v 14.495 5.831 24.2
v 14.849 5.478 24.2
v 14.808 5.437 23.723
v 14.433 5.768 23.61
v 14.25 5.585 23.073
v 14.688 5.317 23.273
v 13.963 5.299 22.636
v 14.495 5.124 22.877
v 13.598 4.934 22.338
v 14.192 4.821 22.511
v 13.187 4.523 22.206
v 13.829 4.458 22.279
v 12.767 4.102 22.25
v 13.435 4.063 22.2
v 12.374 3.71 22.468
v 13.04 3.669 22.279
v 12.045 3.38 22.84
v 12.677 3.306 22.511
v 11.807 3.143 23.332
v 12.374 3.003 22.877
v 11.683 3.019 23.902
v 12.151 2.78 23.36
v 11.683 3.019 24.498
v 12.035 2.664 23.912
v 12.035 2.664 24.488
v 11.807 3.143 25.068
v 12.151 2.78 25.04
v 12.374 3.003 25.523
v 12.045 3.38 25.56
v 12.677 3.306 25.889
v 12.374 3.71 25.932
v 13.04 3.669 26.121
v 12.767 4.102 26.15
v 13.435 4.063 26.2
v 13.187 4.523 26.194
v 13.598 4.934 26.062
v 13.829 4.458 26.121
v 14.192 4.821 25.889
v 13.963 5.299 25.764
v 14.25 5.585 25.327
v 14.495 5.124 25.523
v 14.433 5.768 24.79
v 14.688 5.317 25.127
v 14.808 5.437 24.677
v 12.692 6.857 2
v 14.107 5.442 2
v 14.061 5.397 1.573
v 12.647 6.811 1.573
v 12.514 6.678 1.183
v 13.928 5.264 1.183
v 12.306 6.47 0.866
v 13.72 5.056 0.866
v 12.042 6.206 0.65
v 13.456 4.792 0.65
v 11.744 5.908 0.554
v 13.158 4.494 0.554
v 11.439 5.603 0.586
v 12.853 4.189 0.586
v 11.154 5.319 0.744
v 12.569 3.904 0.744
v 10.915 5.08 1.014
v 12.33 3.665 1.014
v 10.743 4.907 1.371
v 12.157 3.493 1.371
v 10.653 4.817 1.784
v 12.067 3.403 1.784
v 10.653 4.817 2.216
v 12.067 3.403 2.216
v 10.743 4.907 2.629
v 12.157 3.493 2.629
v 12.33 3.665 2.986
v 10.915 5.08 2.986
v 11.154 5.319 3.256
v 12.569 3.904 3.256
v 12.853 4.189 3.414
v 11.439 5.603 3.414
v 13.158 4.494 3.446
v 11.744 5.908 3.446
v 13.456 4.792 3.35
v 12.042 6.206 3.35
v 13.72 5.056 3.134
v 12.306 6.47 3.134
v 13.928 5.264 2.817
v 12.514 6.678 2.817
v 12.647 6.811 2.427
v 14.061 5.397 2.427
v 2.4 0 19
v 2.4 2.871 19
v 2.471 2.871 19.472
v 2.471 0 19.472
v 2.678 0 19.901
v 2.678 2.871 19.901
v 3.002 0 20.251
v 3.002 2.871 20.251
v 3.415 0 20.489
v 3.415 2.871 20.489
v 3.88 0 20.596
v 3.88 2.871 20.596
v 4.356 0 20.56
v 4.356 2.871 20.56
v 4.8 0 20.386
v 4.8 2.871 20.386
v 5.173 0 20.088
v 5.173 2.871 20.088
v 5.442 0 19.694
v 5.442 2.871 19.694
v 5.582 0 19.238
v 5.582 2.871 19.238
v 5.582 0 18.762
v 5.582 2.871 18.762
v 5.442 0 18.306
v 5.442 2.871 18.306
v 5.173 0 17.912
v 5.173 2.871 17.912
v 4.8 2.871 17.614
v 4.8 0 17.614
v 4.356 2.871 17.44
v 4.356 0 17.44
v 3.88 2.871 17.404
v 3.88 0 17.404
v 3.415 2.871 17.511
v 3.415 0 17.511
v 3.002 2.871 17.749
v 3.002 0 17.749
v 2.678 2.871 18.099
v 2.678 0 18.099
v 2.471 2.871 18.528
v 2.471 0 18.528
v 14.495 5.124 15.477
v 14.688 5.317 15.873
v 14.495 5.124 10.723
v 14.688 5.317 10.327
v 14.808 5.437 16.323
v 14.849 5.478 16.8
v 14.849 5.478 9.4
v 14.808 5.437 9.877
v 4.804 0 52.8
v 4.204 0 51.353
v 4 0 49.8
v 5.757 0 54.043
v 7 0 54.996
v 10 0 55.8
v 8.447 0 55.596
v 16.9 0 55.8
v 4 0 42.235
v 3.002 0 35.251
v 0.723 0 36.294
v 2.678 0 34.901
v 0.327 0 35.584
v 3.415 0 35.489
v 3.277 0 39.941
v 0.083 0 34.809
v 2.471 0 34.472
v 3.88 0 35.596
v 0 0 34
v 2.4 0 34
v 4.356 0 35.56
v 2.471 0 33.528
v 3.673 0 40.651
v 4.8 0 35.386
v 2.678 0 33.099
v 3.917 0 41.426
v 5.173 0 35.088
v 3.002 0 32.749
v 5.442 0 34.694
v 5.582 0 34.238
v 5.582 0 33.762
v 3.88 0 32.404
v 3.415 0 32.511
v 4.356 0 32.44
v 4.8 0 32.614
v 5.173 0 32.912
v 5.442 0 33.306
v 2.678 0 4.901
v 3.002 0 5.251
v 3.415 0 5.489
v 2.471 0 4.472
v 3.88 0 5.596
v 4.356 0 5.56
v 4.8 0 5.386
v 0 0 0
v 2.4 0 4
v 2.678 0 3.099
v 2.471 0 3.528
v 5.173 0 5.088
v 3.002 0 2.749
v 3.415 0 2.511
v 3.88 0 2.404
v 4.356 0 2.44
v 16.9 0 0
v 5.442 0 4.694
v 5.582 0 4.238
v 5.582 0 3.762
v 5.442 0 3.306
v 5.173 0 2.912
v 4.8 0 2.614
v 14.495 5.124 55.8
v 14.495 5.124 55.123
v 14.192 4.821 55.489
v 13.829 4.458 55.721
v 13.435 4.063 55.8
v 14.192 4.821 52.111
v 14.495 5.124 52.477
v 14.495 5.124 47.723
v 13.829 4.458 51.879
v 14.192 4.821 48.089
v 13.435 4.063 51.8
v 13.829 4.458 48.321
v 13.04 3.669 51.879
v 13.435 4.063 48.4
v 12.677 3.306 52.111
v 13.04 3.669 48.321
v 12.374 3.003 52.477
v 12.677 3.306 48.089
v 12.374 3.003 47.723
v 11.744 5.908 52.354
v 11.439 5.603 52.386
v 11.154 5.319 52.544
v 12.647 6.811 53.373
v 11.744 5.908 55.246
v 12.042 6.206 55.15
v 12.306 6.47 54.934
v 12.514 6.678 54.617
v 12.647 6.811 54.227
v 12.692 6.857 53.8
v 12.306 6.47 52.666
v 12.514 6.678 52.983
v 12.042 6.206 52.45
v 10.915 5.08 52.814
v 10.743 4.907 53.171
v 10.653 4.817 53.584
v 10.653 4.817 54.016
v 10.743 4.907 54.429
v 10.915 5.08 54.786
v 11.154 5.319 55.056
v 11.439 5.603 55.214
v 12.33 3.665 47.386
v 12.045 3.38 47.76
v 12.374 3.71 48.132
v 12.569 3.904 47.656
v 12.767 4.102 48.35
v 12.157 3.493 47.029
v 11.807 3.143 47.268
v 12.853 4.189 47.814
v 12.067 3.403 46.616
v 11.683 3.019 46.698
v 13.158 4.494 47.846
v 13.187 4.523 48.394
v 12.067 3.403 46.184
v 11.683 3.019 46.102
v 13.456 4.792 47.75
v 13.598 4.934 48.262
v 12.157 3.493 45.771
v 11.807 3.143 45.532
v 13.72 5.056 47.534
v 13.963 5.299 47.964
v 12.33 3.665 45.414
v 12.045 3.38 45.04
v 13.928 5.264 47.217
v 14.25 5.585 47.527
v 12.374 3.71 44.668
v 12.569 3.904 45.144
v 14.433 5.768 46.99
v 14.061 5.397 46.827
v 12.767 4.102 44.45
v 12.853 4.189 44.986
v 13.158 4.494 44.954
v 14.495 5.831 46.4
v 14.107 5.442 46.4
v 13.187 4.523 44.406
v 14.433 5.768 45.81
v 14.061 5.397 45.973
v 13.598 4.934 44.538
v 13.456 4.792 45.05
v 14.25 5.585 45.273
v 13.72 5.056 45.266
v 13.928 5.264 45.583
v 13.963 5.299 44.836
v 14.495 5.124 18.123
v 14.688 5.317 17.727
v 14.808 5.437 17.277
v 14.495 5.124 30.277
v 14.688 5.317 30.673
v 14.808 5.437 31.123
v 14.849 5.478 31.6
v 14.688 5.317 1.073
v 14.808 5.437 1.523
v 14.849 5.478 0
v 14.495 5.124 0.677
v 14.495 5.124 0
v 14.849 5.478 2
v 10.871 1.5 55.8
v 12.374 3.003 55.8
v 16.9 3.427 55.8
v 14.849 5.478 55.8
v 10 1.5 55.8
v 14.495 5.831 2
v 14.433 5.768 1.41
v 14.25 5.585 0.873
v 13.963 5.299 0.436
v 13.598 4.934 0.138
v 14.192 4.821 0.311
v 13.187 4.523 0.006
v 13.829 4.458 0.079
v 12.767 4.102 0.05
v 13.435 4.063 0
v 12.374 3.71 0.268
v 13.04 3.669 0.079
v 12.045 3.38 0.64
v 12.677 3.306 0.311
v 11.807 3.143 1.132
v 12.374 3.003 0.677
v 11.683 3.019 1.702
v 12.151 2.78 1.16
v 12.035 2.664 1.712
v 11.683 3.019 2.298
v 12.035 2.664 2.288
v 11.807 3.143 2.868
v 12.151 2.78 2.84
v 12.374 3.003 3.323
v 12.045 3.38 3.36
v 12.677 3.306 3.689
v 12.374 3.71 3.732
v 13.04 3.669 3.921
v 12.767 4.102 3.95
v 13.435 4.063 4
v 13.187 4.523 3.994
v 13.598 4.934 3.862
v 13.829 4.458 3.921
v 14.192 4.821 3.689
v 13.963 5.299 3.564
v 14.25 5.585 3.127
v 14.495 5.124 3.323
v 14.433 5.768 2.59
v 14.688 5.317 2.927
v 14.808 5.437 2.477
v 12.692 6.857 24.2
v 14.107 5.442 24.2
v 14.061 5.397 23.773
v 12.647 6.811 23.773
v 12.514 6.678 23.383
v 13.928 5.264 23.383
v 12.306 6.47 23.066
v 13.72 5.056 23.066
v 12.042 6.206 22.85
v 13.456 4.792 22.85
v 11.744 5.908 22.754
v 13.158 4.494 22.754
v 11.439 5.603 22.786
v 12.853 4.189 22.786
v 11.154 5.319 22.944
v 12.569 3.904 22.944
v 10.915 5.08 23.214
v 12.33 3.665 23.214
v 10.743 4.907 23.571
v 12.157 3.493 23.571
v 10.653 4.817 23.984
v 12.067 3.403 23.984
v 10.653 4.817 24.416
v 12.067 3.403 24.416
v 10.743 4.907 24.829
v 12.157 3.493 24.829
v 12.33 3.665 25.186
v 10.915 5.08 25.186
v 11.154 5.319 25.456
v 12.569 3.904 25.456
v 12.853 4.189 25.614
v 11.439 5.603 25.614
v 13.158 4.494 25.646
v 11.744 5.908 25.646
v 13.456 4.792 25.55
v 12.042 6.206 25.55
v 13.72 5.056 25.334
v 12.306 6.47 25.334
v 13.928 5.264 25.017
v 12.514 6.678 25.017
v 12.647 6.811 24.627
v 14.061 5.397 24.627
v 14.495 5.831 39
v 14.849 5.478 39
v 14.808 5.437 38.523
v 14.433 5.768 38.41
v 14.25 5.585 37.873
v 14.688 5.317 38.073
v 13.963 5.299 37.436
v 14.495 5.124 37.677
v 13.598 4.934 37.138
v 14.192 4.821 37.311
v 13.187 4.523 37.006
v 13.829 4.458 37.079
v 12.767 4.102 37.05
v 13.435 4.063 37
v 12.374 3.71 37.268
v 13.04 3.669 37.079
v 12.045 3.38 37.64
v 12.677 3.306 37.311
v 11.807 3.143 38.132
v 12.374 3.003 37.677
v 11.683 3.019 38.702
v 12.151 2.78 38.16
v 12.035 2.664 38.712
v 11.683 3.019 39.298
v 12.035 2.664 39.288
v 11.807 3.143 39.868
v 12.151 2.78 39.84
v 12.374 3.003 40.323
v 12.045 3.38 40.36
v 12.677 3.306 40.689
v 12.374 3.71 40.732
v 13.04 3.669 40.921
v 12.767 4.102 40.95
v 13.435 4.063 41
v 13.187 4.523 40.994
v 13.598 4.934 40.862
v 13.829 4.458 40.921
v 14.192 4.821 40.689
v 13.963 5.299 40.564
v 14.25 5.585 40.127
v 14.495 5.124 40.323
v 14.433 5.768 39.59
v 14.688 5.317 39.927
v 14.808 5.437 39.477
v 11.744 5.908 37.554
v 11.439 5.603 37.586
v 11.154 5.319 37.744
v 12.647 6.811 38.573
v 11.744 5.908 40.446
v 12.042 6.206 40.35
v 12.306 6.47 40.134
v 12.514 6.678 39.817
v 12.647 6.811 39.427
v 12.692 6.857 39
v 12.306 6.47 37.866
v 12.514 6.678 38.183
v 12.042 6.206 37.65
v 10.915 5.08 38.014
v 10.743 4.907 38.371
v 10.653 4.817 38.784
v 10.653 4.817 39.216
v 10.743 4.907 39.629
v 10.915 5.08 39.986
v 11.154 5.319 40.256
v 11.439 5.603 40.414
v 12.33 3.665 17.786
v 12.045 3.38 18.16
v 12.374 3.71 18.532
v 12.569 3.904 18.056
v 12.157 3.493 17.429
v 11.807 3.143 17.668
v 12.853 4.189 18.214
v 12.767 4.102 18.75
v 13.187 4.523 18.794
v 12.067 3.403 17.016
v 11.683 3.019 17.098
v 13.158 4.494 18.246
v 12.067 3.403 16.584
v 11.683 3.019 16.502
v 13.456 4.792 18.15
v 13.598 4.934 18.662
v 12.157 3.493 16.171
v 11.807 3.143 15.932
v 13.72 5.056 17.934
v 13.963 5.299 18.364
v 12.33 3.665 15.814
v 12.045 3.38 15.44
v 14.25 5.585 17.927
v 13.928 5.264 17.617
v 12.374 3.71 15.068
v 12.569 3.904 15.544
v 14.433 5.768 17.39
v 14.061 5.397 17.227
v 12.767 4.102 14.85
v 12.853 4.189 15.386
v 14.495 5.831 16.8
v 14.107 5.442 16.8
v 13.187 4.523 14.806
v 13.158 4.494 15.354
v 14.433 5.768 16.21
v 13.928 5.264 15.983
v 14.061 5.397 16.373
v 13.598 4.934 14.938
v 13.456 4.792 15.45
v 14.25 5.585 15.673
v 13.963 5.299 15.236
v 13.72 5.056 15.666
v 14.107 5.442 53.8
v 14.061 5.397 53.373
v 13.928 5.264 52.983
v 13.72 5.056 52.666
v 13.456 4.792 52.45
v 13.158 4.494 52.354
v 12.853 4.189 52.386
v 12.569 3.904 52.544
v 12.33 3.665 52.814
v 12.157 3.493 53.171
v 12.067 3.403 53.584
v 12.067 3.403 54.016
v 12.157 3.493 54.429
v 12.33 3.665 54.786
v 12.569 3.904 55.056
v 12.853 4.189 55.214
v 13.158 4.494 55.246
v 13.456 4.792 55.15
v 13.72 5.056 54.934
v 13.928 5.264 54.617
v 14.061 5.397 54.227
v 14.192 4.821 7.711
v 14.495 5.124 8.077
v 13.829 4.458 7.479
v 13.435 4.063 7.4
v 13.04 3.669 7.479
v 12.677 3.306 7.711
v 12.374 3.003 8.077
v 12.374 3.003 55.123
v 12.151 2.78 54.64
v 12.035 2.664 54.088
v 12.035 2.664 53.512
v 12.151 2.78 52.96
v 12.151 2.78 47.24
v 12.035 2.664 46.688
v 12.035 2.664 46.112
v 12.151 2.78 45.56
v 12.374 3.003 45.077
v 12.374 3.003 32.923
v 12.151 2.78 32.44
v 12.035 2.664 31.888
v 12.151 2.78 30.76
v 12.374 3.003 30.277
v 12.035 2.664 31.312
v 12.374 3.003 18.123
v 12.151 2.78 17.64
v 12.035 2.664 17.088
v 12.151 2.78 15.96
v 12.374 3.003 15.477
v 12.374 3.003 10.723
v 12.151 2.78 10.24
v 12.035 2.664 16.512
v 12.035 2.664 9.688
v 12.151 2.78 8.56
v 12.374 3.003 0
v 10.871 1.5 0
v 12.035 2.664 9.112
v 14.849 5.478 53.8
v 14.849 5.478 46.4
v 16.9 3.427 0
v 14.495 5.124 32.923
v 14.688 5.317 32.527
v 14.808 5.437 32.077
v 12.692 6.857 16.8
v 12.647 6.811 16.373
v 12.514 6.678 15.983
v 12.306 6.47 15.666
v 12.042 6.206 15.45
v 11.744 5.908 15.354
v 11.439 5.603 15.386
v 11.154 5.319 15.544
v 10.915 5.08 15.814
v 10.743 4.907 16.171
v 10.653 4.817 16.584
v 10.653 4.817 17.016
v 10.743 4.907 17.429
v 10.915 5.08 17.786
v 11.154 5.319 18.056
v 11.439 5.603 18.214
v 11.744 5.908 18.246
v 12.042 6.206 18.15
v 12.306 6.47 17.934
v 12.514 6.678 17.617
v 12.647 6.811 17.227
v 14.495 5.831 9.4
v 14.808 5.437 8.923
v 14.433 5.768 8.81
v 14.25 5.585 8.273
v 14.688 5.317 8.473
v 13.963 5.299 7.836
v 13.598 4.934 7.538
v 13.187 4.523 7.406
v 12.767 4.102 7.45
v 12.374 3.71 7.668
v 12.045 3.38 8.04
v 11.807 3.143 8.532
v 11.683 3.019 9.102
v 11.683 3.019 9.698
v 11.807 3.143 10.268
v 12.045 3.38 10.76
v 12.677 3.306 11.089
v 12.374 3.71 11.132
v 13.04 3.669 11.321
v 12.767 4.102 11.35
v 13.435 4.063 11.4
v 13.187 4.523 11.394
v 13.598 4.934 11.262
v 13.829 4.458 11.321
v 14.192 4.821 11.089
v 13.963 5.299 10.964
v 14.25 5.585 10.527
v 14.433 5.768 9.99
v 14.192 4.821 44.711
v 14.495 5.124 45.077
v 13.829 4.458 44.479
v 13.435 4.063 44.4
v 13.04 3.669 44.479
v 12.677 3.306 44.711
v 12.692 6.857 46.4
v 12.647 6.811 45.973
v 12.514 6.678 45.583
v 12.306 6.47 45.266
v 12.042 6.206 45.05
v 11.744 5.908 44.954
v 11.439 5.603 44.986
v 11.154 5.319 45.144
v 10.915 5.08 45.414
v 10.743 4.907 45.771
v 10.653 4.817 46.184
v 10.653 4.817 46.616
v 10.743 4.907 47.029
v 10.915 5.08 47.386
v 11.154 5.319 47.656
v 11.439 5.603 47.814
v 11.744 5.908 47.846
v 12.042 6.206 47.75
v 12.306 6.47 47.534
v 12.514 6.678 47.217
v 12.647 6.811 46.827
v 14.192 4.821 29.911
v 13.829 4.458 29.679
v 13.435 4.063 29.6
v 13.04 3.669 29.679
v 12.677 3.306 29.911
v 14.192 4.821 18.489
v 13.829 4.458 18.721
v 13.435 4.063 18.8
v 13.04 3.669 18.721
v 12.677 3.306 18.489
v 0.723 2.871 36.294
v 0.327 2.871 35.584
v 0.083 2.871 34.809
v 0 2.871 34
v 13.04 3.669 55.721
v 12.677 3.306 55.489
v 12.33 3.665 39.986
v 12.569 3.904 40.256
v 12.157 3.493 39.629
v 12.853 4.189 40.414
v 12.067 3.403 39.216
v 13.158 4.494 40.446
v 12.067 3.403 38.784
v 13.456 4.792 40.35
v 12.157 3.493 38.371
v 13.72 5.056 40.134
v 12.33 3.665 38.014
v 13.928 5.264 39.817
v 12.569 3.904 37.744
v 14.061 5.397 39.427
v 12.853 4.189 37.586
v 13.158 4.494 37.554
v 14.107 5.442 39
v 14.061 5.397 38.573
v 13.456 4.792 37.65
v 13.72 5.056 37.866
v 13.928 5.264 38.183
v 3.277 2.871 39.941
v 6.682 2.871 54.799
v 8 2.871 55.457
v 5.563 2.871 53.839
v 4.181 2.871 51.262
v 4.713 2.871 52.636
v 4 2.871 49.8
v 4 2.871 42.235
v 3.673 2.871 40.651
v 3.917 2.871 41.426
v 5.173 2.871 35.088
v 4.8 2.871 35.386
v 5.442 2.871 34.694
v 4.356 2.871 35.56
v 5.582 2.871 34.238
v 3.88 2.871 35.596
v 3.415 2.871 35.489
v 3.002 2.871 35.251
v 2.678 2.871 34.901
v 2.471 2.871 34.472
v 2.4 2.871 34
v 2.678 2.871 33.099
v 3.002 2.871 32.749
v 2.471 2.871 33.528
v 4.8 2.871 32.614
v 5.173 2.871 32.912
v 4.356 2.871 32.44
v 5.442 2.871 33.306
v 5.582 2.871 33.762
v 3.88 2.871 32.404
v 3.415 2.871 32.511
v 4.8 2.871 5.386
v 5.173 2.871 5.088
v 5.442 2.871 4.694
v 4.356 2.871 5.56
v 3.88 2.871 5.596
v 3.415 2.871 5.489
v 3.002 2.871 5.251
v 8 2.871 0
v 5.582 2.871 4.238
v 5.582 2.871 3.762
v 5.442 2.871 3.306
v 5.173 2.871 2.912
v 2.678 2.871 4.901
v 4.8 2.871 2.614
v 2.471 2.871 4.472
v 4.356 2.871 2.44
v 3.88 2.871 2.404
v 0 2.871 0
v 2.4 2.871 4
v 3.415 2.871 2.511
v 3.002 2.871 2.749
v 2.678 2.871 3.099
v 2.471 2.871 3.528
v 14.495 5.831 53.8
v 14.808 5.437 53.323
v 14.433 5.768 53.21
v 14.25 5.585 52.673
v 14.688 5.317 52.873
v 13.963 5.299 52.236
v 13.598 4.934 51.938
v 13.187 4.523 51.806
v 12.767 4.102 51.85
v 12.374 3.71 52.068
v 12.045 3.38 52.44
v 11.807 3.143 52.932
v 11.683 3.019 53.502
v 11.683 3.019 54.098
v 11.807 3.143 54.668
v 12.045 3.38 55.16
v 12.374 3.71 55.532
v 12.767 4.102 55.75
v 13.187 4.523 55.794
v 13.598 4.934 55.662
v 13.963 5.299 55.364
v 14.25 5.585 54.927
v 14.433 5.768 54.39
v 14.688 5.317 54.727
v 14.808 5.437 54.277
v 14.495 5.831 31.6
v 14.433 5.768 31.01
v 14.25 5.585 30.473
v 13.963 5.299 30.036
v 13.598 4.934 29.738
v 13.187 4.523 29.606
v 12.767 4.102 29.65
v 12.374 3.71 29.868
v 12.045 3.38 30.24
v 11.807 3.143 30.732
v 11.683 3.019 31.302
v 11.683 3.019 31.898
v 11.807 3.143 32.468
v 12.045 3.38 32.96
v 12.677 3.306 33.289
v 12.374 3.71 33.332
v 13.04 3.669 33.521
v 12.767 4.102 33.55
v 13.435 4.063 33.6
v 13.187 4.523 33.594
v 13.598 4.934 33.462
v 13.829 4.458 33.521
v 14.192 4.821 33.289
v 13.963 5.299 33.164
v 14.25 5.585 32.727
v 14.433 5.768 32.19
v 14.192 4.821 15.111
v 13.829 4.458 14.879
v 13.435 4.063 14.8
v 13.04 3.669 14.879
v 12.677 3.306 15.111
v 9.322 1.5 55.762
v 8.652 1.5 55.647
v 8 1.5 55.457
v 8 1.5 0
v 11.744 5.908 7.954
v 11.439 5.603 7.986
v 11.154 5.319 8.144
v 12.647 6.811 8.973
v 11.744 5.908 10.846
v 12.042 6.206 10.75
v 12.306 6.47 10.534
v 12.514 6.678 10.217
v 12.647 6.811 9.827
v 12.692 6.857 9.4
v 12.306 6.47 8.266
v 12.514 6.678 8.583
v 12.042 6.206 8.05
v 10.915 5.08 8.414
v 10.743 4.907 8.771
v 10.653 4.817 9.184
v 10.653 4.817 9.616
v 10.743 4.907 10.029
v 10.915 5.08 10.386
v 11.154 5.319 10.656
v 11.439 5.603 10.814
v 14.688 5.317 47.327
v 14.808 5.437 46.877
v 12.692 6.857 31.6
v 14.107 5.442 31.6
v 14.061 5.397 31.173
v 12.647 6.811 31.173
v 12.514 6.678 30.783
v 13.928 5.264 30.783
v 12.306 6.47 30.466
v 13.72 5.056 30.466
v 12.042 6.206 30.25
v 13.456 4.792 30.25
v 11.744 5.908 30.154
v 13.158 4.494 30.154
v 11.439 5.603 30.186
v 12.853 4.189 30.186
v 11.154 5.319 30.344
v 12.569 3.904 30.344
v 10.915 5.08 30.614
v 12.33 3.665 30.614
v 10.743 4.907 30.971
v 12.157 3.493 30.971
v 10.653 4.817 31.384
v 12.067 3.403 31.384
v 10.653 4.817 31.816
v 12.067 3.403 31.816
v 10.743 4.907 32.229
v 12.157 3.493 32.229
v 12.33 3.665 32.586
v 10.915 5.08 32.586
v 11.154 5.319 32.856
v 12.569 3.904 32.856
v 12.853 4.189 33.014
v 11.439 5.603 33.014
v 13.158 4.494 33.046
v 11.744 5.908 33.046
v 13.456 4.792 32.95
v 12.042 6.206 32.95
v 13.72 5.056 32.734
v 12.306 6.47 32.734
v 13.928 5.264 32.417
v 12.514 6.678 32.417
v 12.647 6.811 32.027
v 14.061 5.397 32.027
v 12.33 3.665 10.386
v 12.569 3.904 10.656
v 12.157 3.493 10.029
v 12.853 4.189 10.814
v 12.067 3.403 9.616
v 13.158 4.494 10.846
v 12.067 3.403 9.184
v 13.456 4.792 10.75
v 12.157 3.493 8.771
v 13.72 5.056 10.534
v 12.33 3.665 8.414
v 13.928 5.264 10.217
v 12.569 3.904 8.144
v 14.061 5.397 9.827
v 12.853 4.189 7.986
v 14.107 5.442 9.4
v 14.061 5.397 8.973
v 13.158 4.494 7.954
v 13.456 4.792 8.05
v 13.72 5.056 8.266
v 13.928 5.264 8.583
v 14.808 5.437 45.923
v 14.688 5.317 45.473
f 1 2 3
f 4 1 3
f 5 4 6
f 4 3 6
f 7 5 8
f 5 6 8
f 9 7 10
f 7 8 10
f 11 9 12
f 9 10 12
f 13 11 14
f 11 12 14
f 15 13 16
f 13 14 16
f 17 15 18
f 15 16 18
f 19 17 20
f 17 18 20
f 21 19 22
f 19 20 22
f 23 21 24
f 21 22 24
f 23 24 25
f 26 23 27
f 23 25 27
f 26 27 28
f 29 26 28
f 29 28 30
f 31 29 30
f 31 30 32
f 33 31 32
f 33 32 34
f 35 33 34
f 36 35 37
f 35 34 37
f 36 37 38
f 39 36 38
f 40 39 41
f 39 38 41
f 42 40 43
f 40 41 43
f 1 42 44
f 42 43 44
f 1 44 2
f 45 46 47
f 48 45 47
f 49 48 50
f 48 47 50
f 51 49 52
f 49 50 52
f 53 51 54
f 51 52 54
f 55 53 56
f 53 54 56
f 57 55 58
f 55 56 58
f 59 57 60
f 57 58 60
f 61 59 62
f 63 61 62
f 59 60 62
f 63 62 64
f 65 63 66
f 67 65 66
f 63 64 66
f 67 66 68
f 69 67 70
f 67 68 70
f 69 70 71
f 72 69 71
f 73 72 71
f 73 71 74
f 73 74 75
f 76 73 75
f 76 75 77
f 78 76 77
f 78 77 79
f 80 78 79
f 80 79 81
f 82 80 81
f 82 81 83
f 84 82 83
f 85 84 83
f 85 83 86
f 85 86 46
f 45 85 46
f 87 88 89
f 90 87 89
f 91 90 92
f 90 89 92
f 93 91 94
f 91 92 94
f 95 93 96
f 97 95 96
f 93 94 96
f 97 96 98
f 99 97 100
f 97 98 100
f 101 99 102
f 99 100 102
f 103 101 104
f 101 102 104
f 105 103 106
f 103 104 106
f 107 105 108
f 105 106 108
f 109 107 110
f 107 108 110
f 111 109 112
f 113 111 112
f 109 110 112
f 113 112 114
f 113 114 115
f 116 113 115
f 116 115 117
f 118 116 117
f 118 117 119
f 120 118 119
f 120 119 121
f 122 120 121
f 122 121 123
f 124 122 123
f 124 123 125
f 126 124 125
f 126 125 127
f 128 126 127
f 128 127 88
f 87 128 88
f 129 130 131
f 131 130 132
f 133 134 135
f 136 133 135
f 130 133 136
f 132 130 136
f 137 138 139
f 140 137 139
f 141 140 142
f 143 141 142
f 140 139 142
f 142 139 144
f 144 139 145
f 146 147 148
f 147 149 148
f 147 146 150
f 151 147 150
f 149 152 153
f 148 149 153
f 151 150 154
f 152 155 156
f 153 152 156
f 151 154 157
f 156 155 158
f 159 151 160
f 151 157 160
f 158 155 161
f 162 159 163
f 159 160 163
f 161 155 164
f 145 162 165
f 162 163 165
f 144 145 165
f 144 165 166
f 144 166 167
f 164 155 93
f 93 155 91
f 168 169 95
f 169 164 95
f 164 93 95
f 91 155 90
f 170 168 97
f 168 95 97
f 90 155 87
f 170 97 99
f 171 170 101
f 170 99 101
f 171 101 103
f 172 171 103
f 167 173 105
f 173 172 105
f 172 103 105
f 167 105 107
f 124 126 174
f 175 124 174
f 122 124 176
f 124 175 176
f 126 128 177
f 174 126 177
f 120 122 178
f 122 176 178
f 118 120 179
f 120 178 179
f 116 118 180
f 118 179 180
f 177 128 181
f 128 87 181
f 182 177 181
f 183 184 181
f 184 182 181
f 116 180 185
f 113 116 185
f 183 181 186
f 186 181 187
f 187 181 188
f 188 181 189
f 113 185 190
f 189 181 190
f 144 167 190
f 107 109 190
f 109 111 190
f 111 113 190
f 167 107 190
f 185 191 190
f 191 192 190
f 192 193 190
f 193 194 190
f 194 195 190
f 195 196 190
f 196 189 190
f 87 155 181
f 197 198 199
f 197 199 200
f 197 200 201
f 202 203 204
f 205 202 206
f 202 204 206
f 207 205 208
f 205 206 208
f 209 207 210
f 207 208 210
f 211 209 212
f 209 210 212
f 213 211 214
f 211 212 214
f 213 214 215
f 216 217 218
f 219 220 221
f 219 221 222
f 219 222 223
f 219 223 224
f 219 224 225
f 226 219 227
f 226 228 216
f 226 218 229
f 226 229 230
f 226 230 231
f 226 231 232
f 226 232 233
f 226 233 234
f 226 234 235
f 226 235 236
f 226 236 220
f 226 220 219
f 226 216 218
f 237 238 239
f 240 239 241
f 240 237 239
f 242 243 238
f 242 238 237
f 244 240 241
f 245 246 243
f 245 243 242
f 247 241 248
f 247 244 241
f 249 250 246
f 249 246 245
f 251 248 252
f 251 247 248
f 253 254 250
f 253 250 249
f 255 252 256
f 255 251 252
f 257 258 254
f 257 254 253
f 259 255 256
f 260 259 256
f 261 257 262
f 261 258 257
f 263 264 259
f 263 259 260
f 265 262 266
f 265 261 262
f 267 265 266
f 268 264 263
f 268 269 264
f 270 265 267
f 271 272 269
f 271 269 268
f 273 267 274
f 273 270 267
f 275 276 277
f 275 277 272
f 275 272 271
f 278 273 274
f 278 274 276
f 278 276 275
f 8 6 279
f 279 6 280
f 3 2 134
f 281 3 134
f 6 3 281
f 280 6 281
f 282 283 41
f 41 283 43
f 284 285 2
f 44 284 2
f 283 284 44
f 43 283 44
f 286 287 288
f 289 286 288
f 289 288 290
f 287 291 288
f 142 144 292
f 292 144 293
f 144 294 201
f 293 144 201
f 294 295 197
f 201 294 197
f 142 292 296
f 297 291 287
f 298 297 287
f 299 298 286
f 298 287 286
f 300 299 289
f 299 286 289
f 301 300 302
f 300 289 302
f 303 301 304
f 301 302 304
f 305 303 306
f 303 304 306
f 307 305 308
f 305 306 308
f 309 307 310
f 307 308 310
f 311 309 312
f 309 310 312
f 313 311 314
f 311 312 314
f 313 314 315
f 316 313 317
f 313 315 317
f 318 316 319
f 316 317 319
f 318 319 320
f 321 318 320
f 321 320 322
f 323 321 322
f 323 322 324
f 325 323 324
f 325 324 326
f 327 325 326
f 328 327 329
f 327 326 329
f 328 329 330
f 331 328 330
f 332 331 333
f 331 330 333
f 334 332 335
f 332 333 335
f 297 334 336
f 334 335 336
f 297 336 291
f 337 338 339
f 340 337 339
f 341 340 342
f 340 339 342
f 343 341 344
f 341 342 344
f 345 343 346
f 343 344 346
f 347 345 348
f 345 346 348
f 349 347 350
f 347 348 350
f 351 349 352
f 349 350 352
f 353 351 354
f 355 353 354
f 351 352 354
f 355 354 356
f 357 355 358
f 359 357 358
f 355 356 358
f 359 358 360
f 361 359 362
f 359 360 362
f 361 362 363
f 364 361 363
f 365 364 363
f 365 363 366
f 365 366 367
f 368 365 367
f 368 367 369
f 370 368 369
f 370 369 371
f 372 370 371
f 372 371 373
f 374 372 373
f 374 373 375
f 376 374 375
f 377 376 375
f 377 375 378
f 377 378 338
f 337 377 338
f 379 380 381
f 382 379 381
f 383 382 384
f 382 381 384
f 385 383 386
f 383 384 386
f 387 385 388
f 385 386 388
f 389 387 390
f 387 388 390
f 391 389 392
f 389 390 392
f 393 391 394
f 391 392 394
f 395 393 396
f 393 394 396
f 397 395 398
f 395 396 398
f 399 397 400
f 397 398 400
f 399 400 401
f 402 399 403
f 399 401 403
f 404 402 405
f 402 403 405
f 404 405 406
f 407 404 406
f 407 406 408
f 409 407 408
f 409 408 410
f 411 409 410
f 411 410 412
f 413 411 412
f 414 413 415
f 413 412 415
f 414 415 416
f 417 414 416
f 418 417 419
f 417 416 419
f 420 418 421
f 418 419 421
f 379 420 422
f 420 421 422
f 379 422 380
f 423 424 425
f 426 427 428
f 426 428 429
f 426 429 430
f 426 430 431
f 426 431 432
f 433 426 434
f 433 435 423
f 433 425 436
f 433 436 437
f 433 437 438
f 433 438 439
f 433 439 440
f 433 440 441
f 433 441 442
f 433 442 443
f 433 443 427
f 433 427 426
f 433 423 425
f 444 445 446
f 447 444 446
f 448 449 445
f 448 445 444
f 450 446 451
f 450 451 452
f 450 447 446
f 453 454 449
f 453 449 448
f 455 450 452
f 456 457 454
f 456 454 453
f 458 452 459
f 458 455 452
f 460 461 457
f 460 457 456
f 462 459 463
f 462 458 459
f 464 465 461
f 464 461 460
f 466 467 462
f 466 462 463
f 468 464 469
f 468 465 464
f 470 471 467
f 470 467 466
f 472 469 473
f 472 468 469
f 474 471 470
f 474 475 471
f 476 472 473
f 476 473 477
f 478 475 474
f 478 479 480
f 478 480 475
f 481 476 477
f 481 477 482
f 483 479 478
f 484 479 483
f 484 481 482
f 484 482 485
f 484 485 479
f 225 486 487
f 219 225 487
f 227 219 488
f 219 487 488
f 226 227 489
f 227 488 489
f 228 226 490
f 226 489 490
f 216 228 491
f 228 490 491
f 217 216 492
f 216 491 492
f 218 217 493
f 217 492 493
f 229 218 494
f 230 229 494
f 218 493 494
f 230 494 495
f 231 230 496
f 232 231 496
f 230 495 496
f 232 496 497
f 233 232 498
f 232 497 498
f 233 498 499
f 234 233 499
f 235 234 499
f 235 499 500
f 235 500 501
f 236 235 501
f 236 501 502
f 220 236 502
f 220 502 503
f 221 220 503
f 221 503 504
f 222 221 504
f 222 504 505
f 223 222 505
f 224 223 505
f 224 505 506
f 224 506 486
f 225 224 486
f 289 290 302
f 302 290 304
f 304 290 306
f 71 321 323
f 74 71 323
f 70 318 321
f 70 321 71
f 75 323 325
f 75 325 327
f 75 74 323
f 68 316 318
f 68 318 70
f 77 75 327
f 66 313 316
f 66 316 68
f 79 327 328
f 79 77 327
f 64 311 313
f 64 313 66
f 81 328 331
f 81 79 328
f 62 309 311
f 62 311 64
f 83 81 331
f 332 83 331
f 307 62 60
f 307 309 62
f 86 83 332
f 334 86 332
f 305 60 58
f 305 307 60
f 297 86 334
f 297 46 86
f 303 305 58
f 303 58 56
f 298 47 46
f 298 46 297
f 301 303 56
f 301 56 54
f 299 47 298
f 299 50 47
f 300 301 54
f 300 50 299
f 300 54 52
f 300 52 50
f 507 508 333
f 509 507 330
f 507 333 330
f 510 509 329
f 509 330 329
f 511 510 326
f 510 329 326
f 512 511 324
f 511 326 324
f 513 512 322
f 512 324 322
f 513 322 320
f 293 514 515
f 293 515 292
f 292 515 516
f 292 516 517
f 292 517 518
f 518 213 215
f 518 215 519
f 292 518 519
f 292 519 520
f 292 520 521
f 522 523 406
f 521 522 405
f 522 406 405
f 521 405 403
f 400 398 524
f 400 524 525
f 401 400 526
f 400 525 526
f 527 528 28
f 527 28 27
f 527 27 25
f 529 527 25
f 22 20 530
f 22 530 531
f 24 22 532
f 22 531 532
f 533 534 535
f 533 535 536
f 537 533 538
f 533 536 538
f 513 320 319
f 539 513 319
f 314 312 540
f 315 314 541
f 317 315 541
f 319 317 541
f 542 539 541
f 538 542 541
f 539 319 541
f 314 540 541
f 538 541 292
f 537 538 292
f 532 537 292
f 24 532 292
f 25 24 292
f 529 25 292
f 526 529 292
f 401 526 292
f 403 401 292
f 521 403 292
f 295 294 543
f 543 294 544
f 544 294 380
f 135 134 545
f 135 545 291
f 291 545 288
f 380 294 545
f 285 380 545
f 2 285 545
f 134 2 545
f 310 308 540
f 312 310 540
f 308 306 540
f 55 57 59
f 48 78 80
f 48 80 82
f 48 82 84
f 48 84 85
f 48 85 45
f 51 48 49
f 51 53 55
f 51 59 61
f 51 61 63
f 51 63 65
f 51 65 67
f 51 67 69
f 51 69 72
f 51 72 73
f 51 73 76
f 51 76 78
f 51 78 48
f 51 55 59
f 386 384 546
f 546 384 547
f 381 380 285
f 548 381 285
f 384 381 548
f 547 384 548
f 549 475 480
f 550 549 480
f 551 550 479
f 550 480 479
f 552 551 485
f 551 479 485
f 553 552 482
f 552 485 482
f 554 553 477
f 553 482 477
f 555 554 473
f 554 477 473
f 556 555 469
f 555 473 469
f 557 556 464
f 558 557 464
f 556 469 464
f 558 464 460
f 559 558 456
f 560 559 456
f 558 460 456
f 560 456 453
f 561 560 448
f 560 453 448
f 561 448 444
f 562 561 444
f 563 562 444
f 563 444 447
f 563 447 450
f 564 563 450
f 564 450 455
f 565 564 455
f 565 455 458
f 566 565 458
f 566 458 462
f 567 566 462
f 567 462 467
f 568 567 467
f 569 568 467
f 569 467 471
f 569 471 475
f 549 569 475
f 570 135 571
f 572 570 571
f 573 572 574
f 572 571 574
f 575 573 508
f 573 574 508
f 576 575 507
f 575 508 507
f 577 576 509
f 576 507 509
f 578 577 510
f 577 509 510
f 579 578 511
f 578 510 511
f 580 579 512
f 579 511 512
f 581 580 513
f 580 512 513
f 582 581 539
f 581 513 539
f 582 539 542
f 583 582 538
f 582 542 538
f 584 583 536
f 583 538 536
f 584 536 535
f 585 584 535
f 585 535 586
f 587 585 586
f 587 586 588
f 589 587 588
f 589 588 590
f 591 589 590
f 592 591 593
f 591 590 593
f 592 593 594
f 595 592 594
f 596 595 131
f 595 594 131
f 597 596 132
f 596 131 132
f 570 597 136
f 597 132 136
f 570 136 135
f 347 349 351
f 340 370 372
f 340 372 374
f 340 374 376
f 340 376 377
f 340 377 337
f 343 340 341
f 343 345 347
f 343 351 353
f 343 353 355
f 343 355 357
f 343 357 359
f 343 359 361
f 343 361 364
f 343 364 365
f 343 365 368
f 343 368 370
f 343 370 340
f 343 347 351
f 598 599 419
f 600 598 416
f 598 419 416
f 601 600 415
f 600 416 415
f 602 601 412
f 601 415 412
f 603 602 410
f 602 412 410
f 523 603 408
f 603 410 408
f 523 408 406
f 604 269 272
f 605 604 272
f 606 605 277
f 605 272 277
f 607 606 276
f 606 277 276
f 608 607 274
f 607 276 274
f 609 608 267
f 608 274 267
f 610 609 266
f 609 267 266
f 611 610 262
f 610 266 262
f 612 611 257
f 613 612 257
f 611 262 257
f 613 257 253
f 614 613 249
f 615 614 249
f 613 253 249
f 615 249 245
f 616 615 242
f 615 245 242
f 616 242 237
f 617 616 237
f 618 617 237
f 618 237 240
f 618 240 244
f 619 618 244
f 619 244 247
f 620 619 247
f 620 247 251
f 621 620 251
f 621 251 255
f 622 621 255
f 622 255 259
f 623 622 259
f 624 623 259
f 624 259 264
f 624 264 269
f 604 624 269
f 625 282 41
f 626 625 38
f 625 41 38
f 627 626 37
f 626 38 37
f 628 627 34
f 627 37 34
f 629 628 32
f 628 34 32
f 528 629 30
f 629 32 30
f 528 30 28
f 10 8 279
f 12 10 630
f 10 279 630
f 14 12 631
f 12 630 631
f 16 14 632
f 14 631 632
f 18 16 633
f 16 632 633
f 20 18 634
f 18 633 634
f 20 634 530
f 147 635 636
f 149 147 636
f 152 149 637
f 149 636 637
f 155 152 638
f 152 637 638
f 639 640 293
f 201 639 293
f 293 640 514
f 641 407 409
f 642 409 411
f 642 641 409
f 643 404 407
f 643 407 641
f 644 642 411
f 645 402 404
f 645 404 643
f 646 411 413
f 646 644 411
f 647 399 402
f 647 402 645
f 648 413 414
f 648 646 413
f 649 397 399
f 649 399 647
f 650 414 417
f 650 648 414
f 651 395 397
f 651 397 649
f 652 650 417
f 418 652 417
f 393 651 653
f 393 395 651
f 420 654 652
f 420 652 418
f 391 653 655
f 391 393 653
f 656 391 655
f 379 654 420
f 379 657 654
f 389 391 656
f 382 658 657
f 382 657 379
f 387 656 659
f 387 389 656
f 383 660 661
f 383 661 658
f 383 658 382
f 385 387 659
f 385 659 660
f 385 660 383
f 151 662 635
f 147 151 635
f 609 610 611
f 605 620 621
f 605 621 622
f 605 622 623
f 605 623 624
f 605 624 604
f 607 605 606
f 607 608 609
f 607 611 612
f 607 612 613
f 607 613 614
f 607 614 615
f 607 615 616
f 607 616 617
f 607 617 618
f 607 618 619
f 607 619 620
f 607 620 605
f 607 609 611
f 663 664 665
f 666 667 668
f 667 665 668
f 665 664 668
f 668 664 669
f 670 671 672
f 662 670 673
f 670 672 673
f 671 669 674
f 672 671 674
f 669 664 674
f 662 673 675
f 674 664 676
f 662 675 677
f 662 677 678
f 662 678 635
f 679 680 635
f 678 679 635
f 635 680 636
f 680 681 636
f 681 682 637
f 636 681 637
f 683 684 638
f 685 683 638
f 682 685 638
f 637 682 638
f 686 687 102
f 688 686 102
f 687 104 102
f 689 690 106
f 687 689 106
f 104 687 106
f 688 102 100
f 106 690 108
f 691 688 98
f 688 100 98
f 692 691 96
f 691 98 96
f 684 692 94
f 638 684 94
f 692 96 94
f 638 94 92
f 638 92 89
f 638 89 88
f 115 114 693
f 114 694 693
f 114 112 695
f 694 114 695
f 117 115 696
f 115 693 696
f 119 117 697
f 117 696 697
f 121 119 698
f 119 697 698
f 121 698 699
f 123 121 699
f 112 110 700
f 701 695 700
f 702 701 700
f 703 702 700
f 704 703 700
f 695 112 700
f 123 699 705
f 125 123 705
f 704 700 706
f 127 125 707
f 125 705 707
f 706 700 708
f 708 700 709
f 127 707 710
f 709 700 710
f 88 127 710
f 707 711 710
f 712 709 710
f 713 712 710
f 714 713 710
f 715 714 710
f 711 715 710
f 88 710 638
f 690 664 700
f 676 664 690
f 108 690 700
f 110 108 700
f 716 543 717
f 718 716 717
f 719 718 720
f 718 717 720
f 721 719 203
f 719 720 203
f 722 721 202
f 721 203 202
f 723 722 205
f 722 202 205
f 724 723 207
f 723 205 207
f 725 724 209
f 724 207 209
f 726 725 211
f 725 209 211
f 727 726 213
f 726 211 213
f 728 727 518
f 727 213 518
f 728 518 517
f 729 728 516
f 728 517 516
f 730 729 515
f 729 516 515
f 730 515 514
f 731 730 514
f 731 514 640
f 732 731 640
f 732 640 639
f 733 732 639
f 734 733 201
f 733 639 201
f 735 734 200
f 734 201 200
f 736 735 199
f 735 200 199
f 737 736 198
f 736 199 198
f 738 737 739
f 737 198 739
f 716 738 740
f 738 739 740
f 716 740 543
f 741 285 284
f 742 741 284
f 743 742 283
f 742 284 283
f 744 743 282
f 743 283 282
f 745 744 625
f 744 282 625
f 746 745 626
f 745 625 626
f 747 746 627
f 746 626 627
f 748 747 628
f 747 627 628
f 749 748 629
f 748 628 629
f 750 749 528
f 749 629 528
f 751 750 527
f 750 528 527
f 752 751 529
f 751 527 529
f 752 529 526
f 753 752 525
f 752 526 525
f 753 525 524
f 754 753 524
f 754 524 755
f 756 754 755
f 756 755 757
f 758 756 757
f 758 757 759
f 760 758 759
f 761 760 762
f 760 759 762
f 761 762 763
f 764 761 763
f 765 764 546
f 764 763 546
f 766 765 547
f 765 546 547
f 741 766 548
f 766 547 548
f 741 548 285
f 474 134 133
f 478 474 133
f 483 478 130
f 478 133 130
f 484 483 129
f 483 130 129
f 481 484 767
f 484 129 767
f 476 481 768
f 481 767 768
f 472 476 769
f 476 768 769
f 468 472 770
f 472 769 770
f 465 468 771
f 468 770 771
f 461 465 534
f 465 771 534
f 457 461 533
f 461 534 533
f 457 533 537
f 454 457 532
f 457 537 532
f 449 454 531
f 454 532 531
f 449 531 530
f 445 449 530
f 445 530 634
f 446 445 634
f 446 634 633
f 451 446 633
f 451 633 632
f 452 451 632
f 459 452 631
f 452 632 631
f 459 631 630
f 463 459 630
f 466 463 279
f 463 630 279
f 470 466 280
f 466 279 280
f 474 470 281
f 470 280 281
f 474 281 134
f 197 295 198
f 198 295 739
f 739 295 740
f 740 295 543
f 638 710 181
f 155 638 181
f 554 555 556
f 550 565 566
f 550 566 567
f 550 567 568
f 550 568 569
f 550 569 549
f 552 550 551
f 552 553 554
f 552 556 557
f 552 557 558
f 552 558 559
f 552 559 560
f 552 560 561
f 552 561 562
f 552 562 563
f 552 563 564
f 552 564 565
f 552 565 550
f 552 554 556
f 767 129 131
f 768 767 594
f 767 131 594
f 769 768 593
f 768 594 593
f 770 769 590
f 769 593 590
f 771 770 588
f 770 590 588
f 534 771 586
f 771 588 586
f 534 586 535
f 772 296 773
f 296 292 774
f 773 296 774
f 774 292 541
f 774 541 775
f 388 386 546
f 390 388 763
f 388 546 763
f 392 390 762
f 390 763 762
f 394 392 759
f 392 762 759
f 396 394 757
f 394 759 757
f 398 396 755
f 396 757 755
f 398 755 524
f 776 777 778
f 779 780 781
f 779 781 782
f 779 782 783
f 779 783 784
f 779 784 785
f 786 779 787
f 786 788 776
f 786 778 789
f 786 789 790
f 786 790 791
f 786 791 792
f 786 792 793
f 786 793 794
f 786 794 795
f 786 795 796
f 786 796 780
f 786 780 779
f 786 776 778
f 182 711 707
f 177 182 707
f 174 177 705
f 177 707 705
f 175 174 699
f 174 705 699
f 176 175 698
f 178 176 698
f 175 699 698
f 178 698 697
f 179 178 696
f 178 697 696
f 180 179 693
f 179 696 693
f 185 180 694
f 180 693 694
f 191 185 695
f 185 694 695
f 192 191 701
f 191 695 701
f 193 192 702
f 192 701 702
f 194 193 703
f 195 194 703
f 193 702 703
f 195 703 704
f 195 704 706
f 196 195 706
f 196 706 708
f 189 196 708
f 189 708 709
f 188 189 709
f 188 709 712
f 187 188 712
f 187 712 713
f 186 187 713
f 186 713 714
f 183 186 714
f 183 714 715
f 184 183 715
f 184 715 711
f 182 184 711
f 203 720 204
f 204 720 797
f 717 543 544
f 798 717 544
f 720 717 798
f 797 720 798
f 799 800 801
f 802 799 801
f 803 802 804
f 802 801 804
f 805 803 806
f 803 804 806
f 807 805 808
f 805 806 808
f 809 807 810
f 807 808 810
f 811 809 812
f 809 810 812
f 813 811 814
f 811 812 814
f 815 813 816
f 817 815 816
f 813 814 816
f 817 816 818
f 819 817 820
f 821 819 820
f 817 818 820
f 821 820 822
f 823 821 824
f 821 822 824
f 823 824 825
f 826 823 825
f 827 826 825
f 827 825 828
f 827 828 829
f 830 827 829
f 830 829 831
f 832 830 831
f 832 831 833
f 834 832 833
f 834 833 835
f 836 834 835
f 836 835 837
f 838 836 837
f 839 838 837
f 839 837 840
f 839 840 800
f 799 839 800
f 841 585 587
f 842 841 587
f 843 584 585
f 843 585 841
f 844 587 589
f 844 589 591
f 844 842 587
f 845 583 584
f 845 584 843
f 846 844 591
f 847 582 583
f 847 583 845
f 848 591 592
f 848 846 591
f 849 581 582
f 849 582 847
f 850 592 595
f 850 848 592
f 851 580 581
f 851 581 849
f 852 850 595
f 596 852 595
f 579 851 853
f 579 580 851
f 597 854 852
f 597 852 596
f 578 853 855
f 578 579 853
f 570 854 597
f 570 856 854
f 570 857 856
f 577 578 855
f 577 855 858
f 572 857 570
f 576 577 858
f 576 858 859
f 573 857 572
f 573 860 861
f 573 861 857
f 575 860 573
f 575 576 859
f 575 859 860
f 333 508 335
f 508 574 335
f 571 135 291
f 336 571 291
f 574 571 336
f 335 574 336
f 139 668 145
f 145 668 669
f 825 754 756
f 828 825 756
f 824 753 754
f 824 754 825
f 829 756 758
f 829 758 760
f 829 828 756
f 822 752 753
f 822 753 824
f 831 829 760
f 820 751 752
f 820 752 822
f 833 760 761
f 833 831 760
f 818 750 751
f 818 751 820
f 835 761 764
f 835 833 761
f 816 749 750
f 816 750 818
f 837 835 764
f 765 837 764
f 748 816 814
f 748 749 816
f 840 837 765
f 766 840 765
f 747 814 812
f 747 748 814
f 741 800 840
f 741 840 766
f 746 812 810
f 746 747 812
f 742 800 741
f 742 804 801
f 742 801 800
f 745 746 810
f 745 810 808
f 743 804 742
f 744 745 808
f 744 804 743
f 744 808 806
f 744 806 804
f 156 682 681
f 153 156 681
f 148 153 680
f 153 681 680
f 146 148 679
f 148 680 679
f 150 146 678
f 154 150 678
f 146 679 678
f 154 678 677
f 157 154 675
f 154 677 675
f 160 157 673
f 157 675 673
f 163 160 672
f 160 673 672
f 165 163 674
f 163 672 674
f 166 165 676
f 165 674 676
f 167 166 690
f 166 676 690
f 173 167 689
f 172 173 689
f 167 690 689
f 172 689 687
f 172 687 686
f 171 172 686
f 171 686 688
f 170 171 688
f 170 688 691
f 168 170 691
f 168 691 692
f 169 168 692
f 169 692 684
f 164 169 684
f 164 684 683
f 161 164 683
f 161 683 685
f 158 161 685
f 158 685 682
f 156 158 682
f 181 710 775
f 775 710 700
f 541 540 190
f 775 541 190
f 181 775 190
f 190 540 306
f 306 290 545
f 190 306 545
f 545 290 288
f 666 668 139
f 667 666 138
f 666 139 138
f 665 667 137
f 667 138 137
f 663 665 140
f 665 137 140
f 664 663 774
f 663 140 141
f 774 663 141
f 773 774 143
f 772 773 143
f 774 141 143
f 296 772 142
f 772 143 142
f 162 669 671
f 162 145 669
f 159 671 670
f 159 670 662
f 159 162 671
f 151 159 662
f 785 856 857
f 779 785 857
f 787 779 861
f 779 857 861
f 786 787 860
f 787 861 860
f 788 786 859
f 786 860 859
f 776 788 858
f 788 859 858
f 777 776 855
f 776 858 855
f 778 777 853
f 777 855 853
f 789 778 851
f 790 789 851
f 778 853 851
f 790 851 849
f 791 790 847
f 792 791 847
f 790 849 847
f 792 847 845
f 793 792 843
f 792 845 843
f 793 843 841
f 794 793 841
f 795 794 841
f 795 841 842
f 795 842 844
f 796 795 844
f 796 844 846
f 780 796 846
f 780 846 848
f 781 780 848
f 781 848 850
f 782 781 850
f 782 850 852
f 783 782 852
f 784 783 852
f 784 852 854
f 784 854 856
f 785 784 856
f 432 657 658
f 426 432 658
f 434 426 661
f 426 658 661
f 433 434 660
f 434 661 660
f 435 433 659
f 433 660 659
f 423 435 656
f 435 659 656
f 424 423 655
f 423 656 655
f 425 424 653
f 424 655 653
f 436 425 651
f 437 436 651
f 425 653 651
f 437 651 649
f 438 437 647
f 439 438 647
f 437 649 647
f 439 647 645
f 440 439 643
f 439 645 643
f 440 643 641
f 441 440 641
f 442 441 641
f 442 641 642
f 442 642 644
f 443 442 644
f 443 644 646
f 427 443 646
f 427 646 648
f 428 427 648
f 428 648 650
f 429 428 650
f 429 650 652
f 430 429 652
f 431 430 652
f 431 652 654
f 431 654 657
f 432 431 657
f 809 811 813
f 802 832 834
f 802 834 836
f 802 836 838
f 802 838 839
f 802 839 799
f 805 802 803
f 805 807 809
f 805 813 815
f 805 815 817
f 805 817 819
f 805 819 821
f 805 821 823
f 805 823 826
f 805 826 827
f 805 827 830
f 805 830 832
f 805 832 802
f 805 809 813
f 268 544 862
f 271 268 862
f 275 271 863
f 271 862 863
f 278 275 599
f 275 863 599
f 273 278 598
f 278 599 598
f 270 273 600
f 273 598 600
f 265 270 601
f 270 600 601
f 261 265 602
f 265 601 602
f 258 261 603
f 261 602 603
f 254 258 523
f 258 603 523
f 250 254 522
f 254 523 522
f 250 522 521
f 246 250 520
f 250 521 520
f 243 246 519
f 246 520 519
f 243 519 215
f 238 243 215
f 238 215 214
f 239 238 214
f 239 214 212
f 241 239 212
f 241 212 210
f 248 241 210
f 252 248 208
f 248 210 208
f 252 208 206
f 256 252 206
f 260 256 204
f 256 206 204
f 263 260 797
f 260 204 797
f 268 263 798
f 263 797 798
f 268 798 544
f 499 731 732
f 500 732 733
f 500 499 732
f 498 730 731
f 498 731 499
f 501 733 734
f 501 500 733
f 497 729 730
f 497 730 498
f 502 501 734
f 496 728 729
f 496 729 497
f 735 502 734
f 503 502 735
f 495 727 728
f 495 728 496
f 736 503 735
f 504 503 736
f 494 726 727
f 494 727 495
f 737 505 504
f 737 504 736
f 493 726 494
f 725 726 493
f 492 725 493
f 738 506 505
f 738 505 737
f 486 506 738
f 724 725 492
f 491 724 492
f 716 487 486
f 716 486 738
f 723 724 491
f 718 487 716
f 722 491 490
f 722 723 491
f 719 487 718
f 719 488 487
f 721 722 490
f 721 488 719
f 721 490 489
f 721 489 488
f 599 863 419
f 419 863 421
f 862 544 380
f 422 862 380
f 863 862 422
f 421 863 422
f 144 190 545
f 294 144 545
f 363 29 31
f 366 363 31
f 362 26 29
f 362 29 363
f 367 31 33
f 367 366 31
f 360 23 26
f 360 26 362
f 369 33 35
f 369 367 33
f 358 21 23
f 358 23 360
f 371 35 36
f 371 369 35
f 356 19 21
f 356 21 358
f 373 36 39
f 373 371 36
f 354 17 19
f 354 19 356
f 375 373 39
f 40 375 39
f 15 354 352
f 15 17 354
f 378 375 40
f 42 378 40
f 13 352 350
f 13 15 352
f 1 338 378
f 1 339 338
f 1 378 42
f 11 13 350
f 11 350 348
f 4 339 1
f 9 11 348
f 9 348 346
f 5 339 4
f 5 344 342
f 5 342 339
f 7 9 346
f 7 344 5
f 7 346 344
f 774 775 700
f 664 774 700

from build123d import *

# Parameters (mm, degrees)
EXTRUDE_1_DEPTH        = 63.5
SKETCH_2_R             = 1.45
EXTRUDE_2_DEPTH        = 2.5
SKETCH_3_R             = 2
EXTRUDE_3_DEPTH        = 0.5
PATTERN_LINEAR_1_COUNT = 9
PATTERN_LINEAR_1_PITCH = 7.4
SKETCH_4_R             = 1.6
CUT_EXTRUDE_1_DEPTH    = 10.5
PATTERN_LINEAR_2_COUNT = 3
PATTERN_LINEAR_2_PITCH = 15
CUT_EXTRUDE_2_DEPTH    = 5
FILLET_1_R             = 6
FILLET_2_R             = 4


with BuildPart() as part:
    # 草图1 → 凸台-拉伸1 (new body)
    with BuildSketch(Plane.XY):
        Polygon((16.9, 0), (16.9, 3.426641456), (14.8489809, 5.477660556), (14.495427509, 5.124107166), (12.374107166, 3.002786822), (10.871320344, 1.5), (8, 1.5), (8, 2.871320344), (0, 2.871320344), (0, 0), align=None)
    extrude(amount=EXTRUDE_1_DEPTH)

    # 草图2 → 凸台-拉伸2 (add)
    with BuildSketch(Plane(origin=(4.685660172, -4.685660172, 0), x_dir=(0, 0, 1), z_dir=(-0.7071067811865562, 0.7071067811865389, 0))):
        with Locations(Location((2, 12.373106012, 0), (0, 0, 90))):
            Circle(SKETCH_2_R)
    extrude_2 = extrude(amount=EXTRUDE_2_DEPTH)

    # 草图3 → 凸台-拉伸3 (add)
    with BuildSketch(Plane(origin=(4.685660172, -4.685660172, 0), x_dir=(0, 0, 1), z_dir=(-0.7071067811865562, 0.7071067811865389, 0))):
        with Locations(Location((2, 12.373106012, 0), (0, 0, 90))):
            Circle(SKETCH_3_R)
    extrude_3 = extrude(amount=EXTRUDE_3_DEPTH)

    # 阵列(线性)1: 凸台-拉伸2, 凸台-拉伸3 ×9
    with Locations(*[(0, 0, i * PATTERN_LINEAR_1_PITCH) for i in range(1, PATTERN_LINEAR_1_COUNT)]):
        add(extrude_2)
        add(extrude_3)

    # 草图4 → 切除-拉伸1 (cut)
    with BuildSketch(Plane(origin=(0, 2.871320344, 0), x_dir=(1, 0, 0), z_dir=(0, 1, 0))):
        with Locations(Location((4, -4, 0), (0, 0, 180))):
            Circle(SKETCH_4_R)
    cut_extrude_1 = extrude(amount=-CUT_EXTRUDE_1_DEPTH, mode=Mode.SUBTRACT)

    # 阵列(线性)2: 切除-拉伸1 ×3
    with Locations(*[(0, 0, i * PATTERN_LINEAR_2_PITCH) for i in range(1, PATTERN_LINEAR_2_COUNT)]):
        add(cut_extrude_1, mode=Mode.SUBTRACT)

    # 草图6 → 切除-拉伸2 (cut, symmetric)
    with BuildSketch(Plane(origin=(0, 2.871320344, 0), x_dir=(1, 0, 0), z_dir=(0, 1, 0))):
        with BuildLine():
            Line((4, -40.973787182), (0.723391823, -36.294305745))
            ThreePointArc((0.723391823, -36.294305745), (0.185132197, -35.202823198), (0, -34))
            Line((0, -34), (-4.848158237, -34))
            Line((-4.848158237, -34), (-4.848158237, -69.568318456))
            Line((-4.848158237, -69.568318456), (19.447072331, -69.568318456))
            Line((19.447072331, -69.568318456), (19.447072331, -55.8))
            Line((19.447072331, -55.8), (4, -55.8))
            Line((4, -55.8), (4, -40.973787182))
        make_face()
    extrude(amount=CUT_EXTRUDE_2_DEPTH, both=True, mode=Mode.SUBTRACT)

    # 圆角1
    fillet_1_edges = [part.edges().sort_by_distance(p)[0] for p in [
        (4, 1.435660172, 55.8),
    ]]
    fillet(fillet_1_edges, radius=FILLET_1_R)

    # 圆角2
    fillet_2_edges = [part.edges().sort_by_distance(p)[0] for p in [
        (4, 1.435660172, 40.973787182),
    ]]
    fillet(fillet_2_edges, radius=FILLET_2_R)


solid = part.part
